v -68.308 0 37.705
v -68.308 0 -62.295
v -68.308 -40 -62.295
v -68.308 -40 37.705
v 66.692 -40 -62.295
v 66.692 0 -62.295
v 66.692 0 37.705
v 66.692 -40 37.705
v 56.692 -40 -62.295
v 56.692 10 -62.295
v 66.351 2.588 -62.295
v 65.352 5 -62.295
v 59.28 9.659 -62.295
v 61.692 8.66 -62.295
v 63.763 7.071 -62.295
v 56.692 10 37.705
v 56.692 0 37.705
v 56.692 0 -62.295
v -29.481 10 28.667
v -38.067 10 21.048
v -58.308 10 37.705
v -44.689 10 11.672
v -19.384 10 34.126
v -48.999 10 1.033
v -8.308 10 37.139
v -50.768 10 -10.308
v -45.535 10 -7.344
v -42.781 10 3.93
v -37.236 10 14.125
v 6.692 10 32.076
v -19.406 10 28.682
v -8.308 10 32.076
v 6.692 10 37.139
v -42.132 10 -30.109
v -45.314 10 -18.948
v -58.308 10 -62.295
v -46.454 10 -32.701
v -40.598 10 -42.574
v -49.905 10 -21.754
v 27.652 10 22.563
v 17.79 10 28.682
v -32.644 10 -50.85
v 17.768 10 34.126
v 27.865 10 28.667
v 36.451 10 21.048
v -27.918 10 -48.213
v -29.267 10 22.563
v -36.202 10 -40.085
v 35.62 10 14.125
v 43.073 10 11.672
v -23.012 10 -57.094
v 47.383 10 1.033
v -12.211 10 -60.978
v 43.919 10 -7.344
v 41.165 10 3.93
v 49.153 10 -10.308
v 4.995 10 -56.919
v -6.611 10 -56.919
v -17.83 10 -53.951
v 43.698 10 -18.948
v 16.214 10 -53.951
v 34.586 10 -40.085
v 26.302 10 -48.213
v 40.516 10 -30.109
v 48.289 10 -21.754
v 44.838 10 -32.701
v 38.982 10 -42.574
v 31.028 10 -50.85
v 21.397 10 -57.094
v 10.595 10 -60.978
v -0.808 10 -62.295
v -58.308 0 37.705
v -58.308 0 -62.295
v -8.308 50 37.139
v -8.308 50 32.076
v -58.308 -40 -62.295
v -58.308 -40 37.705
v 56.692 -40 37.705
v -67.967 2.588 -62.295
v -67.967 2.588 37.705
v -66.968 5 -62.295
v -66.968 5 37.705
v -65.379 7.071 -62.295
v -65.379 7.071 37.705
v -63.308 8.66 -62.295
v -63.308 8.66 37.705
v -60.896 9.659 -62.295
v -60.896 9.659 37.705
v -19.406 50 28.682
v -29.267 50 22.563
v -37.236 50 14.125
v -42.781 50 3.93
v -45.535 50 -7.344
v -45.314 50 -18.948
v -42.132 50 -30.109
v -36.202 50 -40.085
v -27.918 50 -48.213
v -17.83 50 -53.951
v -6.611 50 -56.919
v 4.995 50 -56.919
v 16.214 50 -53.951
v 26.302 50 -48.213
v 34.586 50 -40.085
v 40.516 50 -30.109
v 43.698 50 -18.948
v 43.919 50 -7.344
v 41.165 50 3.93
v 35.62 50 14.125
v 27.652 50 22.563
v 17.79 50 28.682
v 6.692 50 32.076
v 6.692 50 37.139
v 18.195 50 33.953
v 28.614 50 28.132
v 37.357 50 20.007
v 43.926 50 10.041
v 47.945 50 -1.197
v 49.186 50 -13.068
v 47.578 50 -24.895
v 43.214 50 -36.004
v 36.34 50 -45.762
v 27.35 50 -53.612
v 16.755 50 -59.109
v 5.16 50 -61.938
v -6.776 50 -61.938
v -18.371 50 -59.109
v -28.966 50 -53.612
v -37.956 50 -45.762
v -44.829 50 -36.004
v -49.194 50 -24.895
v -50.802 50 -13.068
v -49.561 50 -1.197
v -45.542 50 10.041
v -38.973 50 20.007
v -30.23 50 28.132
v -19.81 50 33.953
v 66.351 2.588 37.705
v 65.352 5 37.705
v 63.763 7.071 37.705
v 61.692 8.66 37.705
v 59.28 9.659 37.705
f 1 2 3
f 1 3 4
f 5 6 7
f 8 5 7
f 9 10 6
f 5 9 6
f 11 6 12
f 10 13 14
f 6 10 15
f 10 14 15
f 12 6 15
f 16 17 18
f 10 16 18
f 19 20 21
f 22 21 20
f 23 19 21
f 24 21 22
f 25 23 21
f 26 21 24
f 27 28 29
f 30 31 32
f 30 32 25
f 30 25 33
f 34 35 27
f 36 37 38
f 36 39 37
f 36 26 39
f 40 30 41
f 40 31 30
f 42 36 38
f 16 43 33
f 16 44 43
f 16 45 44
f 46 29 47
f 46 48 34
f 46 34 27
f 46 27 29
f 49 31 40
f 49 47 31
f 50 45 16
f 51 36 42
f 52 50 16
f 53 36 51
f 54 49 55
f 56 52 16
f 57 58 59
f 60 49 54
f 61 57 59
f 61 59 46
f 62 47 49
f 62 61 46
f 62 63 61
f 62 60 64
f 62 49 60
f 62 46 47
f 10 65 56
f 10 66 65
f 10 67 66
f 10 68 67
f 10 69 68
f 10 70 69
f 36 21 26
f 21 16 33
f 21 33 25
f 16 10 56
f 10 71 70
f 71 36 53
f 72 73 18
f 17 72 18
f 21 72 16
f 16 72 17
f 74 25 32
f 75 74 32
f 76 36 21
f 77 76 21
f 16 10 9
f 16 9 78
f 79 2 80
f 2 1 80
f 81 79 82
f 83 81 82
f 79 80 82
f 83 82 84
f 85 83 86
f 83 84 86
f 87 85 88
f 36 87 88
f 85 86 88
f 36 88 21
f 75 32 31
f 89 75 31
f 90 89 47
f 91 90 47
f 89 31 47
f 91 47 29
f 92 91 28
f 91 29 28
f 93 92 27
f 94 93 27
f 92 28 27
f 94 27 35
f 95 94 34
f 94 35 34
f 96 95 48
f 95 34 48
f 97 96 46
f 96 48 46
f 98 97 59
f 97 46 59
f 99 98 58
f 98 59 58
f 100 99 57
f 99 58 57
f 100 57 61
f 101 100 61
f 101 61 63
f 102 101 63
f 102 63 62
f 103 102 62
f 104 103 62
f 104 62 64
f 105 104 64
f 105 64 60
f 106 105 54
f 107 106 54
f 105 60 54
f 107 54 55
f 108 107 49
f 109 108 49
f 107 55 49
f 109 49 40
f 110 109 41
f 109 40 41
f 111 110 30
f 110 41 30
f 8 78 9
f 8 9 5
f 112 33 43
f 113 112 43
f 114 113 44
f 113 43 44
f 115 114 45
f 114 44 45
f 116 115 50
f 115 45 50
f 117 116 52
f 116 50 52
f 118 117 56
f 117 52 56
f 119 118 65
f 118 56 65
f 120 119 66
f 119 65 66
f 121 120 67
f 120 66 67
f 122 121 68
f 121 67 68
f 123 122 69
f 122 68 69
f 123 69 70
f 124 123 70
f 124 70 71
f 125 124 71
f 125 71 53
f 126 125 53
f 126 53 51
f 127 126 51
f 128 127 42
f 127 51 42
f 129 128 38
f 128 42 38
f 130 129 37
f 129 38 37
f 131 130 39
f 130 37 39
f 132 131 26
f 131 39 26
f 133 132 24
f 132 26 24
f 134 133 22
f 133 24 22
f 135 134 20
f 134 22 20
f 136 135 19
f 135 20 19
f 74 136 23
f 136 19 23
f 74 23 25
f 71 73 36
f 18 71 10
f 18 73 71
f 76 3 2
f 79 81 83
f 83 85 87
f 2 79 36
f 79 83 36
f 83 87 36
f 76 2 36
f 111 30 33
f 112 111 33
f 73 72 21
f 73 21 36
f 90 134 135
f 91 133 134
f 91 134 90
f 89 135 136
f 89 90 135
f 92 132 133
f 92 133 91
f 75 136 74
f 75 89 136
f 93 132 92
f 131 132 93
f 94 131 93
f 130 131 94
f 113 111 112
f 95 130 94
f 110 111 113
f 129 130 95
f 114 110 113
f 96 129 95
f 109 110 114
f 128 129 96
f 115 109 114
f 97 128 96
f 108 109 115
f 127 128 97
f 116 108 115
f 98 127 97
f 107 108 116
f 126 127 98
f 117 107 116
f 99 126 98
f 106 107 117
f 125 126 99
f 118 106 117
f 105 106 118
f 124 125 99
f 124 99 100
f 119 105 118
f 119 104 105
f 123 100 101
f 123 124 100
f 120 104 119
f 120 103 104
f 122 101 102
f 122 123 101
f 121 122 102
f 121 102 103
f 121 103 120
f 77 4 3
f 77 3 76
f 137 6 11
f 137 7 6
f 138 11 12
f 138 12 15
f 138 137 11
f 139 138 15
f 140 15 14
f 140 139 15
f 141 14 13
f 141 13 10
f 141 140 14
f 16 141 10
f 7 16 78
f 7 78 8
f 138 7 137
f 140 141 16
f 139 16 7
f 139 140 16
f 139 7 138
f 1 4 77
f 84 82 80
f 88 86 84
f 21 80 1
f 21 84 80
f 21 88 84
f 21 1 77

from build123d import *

# Parameters (mm, degrees)
SOCLE_W                                        = 115
SOCLE_H                                        = 100
EXTRUSION_DU_SOCLE_DEPTH                       = 10
EXTRUSION_DES_FIXATIONS_LAT_RALES_DEPTH        = 40
EXTRUSION_DES_FIXATIONS_LAT_RALES_DEPTH_BACK   = 10
FIXATIONS_LAT_RALES_W                          = 10
FIXATIONS_LAT_RALES_H                          = 100
EXTRUSION_DES_FIXATIONS_LAT_RALES_2_DEPTH      = 40
EXTRUSION_DES_FIXATIONS_LAT_RALES_2_DEPTH_BACK = 10
CONG_FIXATION_GAUCHE_R                         = 10
CONG_FIXATION_DROITE_R                         = 10
EXTRUSION_FIXATION_TASSE_DEPTH                 = 40


with BuildPart() as part:
    # socle → extrusion du socle (new body)
    with BuildSketch(Plane(origin=(0, 0, 0), x_dir=(1, 0, 0), z_dir=(0, 1, 0))):
        with Locations((-0.807962529, 12.295081967)):
            Rectangle(SOCLE_W, SOCLE_H)
    extrude(amount=EXTRUSION_DU_SOCLE_DEPTH)

    # socle tasse → extrusion fixation tasse (add)
    with BuildSketch(Plane(origin=(0, 10, 0), x_dir=(1, 0, 0), z_dir=(0, 1, 0))):
        with BuildLine():
            ThreePointArc((6.692037471, -37.139217866), (-0.807962529, 62.295081967), (-8.307962529, -37.139217866))
            Line((-8.307962529, -37.139217866), (-8.307962529, -32.075516406))
            ThreePointArc((-8.307962529, -32.075516406), (-0.807962529, 57.295081967), (6.692037471, -32.075516406))
            Line((6.692037471, -32.075516406), (6.692037471, -37.139217866))
        make_face()
    extrude(amount=EXTRUSION_FIXATION_TASSE_DEPTH)


with BuildPart() as body_2:
    # fixations latérales → extrusion des fixations latérales (new, two sides: drawn at the far end of the back side and taken through both)
    with BuildSketch(Plane.XZ.offset(-EXTRUSION_DES_FIXATIONS_LAT_RALES_DEPTH_BACK)):
        with Locations((-63.307962529, -12.295081967)):
            Rectangle(FIXATIONS_LAT_RALES_W, FIXATIONS_LAT_RALES_H)
    extrude(amount=EXTRUSION_DES_FIXATIONS_LAT_RALES_DEPTH + EXTRUSION_DES_FIXATIONS_LAT_RALES_DEPTH_BACK)

    # congé fixation gauche
    cong_fixation_gauche_edges = [body_2.edges().sort_by_distance(p)[0] for p in [
        (-68.307962529, 10, -12.295081967),
    ]]
    fillet(cong_fixation_gauche_edges, radius=CONG_FIXATION_GAUCHE_R - 0.0001)  # a hair under: the kernel refuses the full size


with BuildPart() as body_3:
    # fixations latérales → extrusion des fixations lat_rales 2 (new, two sides: drawn at the far end of the back side and taken through both)
    with BuildSketch(Plane.XZ.offset(-EXTRUSION_DES_FIXATIONS_LAT_RALES_2_DEPTH_BACK)):
        with Locations((61.692037471, -12.295081967)):
            Rectangle(FIXATIONS_LAT_RALES_W, FIXATIONS_LAT_RALES_H)
    extrude(amount=EXTRUSION_DES_FIXATIONS_LAT_RALES_2_DEPTH + EXTRUSION_DES_FIXATIONS_LAT_RALES_2_DEPTH_BACK)

    # congé fixation droite
    cong_fixation_droite_edges = [body_3.edges().sort_by_distance(p)[0] for p in [
        (66.692037471, 10, -12.295081967),
    ]]
    fillet(cong_fixation_droite_edges, radius=CONG_FIXATION_DROITE_R - 0.0001)  # a hair under: the kernel refuses the full size


solid = Compound([part.part, body_2.part, body_3.part])
